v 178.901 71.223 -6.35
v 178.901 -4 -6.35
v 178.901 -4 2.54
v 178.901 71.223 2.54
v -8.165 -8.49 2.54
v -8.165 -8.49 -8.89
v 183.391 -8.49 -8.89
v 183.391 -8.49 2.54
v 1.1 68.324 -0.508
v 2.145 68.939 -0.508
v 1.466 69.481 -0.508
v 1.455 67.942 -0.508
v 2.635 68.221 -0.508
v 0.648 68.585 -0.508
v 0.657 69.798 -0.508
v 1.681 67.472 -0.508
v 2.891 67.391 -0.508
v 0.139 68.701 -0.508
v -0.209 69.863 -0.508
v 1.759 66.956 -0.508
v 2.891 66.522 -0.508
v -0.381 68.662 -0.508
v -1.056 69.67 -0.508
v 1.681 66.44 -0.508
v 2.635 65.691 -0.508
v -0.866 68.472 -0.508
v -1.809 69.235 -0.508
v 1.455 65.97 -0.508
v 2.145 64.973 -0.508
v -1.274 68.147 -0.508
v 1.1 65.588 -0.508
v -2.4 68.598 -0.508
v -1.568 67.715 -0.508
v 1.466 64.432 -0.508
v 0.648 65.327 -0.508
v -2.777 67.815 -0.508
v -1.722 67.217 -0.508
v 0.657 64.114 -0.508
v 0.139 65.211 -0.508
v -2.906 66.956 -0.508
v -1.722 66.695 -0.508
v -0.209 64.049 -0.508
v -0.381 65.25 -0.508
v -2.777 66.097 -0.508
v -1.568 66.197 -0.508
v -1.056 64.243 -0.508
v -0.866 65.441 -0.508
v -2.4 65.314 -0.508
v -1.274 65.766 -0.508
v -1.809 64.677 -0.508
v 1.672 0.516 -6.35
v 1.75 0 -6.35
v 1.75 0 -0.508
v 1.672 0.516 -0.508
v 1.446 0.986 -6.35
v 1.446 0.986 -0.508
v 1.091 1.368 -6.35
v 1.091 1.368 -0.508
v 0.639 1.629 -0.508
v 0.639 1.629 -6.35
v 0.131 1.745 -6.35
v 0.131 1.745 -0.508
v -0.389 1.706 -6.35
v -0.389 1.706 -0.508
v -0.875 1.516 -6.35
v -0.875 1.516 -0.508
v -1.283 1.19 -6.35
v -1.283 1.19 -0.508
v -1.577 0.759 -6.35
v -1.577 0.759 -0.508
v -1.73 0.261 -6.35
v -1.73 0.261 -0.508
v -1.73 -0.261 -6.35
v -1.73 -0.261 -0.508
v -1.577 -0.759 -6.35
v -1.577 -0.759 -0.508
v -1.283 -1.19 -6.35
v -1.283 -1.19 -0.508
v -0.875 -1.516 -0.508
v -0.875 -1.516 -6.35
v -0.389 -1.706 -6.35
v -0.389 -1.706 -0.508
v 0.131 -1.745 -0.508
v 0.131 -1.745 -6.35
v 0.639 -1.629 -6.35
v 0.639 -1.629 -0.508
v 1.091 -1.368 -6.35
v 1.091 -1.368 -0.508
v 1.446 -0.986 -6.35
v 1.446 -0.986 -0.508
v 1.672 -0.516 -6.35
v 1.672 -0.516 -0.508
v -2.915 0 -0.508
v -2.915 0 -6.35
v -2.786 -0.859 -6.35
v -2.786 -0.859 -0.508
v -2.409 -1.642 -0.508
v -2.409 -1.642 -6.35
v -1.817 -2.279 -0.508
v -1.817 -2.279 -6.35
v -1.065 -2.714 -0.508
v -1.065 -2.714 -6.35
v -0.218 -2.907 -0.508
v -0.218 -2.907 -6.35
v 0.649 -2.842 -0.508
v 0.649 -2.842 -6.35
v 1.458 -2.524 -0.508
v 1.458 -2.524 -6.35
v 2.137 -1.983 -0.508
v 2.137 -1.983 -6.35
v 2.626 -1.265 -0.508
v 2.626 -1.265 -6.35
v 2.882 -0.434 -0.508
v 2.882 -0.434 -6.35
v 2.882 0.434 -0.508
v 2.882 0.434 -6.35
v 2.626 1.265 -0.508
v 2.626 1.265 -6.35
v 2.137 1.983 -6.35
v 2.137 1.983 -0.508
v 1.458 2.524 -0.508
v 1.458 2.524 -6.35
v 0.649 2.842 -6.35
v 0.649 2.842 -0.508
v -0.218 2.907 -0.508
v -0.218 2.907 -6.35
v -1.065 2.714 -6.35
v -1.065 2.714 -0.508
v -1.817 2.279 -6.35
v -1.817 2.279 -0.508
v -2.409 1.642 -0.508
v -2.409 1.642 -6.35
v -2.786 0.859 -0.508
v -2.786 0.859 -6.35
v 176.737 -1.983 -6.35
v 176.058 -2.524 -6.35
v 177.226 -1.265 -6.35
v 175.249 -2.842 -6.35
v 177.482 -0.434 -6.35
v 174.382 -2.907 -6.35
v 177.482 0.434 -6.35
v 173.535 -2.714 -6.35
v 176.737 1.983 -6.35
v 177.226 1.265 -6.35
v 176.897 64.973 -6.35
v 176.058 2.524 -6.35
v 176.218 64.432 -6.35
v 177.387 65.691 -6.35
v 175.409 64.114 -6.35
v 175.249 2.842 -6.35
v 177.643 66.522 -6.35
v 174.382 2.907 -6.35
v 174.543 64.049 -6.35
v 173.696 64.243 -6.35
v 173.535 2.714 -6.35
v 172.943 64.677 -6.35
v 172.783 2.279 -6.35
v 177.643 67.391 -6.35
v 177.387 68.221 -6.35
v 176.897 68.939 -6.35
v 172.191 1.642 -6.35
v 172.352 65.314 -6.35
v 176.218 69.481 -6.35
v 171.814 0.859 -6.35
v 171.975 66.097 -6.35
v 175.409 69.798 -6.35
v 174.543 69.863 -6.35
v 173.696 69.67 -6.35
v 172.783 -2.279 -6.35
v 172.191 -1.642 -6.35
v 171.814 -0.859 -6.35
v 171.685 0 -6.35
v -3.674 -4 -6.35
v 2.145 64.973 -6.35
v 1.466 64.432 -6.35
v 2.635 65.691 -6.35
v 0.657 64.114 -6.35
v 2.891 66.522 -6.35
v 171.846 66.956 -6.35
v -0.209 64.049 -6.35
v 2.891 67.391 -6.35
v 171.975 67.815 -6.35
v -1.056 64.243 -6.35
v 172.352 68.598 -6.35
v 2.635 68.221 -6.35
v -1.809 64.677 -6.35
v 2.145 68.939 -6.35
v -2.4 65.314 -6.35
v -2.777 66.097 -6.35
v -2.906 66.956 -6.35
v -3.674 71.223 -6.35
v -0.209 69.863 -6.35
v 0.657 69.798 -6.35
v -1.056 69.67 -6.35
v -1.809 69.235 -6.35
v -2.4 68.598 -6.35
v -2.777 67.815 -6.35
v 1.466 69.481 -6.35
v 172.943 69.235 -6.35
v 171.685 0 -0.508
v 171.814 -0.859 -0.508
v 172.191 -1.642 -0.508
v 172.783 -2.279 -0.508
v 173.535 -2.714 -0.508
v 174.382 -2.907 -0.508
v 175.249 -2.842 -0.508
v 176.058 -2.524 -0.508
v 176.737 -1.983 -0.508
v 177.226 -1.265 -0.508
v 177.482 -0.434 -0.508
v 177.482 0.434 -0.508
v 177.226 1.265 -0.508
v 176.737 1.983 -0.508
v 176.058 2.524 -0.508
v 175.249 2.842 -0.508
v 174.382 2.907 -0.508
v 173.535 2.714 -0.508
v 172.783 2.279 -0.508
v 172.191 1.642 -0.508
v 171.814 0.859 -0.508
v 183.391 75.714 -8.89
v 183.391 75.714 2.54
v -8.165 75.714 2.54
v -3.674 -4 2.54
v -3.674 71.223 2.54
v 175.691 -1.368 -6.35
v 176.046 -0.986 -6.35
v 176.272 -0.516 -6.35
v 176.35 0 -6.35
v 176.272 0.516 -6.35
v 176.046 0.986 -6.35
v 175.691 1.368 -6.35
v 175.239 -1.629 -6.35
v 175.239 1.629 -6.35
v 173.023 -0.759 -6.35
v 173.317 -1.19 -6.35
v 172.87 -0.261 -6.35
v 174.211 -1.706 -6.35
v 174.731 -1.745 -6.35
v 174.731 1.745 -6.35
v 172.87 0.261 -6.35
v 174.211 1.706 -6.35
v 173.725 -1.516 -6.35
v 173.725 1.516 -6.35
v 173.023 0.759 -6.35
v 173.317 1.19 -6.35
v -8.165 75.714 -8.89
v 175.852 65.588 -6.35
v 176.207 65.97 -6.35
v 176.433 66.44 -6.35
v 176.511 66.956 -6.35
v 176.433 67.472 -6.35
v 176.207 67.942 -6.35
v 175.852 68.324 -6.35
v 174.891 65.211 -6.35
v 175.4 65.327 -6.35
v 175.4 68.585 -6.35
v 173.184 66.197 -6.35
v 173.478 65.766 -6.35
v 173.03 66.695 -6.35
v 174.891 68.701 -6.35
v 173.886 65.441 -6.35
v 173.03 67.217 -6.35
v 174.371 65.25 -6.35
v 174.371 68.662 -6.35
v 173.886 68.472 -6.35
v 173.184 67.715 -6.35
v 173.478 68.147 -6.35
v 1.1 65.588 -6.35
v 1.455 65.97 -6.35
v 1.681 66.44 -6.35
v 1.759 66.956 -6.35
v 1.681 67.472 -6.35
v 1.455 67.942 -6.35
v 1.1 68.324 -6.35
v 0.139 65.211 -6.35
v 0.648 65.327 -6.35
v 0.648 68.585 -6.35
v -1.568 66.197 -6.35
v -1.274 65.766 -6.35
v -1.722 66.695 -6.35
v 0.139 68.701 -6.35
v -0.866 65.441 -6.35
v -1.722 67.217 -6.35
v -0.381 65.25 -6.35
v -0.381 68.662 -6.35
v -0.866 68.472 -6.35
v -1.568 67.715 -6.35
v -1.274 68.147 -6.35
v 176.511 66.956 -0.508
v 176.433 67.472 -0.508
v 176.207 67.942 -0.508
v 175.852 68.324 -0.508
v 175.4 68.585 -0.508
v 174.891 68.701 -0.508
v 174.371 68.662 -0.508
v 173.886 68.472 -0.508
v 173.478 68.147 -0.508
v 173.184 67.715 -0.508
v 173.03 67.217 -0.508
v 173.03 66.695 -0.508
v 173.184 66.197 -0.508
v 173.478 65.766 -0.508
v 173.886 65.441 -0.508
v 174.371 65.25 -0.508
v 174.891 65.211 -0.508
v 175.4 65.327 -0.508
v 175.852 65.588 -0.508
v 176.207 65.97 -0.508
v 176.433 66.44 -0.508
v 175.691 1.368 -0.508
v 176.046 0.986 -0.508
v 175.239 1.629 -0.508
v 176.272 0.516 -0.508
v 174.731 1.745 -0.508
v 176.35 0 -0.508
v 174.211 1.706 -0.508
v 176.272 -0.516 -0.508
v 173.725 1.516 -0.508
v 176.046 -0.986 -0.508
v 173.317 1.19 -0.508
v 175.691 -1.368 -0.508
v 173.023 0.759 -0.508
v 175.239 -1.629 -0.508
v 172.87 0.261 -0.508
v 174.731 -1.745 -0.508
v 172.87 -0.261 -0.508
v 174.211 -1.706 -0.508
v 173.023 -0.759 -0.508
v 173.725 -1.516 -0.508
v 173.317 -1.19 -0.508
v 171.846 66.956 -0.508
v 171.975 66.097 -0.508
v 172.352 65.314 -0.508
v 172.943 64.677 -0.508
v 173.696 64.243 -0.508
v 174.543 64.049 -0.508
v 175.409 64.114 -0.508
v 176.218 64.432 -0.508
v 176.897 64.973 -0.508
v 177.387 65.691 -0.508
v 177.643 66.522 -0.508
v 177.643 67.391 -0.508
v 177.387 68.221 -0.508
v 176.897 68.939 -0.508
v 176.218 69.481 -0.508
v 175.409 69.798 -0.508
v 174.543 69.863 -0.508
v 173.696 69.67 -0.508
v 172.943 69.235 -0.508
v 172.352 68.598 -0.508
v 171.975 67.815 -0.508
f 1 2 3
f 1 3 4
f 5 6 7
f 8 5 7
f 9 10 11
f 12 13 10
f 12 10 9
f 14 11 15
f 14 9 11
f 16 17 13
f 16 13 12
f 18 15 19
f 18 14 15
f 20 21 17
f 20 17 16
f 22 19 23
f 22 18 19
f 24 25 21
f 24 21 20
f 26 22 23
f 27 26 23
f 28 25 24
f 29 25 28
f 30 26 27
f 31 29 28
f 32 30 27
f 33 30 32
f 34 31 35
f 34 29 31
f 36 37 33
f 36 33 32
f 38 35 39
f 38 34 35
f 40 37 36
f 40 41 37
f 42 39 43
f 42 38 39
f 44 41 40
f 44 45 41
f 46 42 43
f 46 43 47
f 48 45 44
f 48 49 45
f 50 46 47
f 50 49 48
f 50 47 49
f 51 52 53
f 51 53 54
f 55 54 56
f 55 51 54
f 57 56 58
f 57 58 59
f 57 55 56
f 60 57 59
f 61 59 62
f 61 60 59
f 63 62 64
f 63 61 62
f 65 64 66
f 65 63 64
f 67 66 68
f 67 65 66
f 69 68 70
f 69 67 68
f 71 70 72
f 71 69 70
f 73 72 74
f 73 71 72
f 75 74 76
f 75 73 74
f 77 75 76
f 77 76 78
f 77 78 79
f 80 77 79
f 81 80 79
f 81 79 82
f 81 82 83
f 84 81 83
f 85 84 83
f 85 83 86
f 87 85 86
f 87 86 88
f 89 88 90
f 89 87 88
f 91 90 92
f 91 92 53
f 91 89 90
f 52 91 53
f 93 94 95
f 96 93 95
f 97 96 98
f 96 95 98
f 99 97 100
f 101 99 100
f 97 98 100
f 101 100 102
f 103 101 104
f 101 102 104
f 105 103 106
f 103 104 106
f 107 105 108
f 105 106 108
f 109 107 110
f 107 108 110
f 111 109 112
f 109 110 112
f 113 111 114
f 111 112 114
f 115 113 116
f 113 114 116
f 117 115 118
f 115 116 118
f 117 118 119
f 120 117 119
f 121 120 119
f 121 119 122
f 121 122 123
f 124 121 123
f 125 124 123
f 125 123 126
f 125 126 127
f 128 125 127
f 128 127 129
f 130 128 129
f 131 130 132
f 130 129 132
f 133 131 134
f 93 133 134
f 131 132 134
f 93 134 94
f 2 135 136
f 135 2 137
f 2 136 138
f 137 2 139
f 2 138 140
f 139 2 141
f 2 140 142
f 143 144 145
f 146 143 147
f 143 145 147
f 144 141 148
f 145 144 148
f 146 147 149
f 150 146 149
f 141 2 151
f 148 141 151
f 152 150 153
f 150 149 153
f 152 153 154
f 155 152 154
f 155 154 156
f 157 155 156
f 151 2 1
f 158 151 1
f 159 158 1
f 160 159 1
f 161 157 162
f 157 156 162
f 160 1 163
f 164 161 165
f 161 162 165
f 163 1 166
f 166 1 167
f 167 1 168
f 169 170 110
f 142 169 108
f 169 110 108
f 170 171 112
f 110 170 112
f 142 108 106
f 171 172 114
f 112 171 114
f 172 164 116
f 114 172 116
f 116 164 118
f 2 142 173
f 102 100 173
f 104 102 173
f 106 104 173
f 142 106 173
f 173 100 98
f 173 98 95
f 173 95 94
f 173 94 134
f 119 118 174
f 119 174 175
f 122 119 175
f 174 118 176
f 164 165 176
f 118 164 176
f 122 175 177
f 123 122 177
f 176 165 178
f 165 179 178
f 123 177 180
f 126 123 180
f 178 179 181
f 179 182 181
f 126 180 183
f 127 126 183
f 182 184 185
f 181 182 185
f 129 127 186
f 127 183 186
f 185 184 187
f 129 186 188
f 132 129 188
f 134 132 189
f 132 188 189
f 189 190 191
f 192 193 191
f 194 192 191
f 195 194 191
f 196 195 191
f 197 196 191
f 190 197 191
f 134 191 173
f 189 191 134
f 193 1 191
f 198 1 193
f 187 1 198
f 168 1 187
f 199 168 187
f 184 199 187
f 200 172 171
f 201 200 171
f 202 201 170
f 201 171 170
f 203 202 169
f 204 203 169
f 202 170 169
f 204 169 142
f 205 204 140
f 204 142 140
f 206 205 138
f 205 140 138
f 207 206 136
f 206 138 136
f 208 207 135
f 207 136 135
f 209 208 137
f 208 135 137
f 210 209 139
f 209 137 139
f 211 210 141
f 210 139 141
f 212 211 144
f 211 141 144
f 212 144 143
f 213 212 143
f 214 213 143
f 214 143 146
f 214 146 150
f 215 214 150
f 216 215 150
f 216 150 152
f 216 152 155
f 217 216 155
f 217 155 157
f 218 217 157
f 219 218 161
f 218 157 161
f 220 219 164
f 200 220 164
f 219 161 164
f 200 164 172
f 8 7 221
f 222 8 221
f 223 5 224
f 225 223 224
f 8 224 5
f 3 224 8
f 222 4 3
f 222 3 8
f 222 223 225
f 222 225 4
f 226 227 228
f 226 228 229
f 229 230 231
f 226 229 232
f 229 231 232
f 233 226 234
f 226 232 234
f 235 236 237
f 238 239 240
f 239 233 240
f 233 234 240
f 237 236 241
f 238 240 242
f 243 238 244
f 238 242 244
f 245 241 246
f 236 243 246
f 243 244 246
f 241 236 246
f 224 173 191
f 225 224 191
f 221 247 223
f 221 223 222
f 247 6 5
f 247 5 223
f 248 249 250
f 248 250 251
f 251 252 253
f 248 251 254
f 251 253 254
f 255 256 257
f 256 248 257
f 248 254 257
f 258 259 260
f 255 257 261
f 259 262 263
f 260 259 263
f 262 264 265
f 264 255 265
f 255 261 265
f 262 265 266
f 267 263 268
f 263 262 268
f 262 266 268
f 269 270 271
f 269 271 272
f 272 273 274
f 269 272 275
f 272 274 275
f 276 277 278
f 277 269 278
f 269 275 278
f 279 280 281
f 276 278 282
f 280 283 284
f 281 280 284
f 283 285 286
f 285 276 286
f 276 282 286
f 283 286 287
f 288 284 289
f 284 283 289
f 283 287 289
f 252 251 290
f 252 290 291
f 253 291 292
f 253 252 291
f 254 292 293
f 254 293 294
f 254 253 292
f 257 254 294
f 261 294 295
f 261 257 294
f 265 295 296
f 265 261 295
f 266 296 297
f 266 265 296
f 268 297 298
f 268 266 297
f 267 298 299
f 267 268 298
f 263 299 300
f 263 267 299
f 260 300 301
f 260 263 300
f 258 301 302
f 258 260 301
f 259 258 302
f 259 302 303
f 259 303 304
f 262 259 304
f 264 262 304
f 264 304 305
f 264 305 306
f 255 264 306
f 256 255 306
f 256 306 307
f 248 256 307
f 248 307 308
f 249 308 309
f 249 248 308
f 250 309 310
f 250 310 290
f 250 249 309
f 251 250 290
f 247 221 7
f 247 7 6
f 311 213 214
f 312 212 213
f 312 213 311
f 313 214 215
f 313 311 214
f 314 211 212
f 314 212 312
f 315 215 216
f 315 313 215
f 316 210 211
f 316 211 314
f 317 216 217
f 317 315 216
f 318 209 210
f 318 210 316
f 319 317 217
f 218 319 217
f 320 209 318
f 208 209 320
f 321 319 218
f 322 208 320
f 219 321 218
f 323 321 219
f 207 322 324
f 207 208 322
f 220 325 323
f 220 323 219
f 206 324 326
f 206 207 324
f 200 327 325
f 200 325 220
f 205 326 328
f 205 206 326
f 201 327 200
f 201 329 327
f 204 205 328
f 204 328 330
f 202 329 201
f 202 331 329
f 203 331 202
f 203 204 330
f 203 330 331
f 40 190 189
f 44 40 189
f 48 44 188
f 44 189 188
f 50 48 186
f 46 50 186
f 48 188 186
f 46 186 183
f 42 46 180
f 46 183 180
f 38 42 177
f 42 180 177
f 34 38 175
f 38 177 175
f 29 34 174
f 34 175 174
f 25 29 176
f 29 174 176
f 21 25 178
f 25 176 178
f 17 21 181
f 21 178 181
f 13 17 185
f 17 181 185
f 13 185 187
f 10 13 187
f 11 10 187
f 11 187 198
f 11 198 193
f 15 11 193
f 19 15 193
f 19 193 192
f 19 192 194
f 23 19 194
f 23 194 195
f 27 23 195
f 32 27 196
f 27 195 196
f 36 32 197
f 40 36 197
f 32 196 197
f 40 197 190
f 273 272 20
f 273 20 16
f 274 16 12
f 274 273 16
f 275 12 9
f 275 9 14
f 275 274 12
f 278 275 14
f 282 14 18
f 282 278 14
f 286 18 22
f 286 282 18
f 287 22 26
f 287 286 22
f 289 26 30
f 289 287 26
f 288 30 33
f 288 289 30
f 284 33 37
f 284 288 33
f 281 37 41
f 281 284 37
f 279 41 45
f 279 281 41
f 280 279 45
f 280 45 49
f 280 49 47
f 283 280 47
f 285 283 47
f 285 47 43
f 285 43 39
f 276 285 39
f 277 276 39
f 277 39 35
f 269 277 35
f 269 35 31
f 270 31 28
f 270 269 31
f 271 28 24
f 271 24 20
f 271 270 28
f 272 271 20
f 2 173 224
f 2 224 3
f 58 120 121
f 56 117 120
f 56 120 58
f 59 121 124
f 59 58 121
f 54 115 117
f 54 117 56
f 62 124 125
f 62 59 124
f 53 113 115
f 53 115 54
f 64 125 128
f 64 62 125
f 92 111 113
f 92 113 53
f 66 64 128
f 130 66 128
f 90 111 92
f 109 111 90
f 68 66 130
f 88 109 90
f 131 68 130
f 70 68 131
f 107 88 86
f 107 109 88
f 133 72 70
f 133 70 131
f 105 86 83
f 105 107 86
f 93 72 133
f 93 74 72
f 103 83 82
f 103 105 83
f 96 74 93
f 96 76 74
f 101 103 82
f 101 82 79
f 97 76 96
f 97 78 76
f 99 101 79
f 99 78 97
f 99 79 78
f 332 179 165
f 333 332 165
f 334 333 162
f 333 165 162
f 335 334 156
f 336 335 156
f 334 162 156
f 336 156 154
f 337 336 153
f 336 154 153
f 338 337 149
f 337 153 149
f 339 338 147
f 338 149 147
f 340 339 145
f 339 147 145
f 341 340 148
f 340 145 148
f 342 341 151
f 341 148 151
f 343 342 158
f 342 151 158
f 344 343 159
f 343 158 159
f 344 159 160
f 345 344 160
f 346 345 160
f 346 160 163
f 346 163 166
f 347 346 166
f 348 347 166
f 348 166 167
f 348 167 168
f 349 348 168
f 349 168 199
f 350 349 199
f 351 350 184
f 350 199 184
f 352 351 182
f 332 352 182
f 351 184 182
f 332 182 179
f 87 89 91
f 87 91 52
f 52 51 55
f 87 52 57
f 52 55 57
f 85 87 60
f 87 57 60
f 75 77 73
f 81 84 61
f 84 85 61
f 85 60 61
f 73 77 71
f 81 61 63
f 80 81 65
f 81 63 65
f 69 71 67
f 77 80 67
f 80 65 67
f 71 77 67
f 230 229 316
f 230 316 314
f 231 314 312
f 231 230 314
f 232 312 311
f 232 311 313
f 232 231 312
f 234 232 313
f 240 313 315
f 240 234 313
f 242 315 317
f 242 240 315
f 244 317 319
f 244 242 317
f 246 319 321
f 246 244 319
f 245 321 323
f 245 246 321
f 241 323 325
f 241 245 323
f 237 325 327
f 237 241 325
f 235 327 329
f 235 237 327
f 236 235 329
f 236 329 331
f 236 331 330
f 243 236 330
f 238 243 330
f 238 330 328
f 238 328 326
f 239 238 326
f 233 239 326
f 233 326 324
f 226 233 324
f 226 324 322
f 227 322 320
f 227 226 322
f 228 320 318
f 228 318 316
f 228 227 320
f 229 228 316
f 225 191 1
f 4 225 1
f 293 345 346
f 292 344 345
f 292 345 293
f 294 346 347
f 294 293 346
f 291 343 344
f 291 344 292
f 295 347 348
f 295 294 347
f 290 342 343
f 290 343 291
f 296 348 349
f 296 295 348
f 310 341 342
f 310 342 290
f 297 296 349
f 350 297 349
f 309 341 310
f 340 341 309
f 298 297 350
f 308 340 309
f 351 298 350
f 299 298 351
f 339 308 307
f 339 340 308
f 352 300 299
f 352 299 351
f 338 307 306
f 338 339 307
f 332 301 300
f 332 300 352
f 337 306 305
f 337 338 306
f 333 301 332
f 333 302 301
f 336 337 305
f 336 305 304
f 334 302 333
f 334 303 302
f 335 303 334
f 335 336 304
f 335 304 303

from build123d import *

# Parameters (mm, degrees)
BOSS_EXTRUDE1_DEPTH      = 2.54
BOSS_EXTRUDE1_DEPTH_BACK = 8.89
SKETCH1_W                = 191.555456122
SKETCH1_H                = 84.203656122
SKETCH1_W_2              = 182.5752
SKETCH1_H_2              = 75.2234
SKETCH3_W                = 182.5752
SKETCH3_H                = 75.2234
BOSS_EXTRUDE4_DEPTH      = 2.54
SKETCH4_R                = 2.9150268
SKETCH4_R_2              = 1.75
BOSS_EXTRUDE6_DEPTH      = 5.842


with BuildPart() as part:
    # Sketch1 → Boss-Extrude1 (new, two sides: drawn at the far end of the back side and taken through both)
    with BuildSketch(Plane.XY.offset(-BOSS_EXTRUDE1_DEPTH_BACK)):
        with Locations((87.6132, 33.6117)):
            Rectangle(SKETCH1_W, SKETCH1_H)
        with Locations((87.6132, 33.6117)):
            Rectangle(SKETCH1_W_2, SKETCH1_H_2, mode=Mode.SUBTRACT)
    extrude(amount=BOSS_EXTRUDE1_DEPTH + BOSS_EXTRUDE1_DEPTH_BACK)

    # Sketch3 → Boss-Extrude4 (add)
    with BuildSketch(Plane(origin=(0, 0, -8.89), x_dir=(-1, 0, 0), z_dir=(0, 0, -1))):
        with Locations((-87.6132, 33.6117)):
            Rectangle(SKETCH3_W, SKETCH3_H)
    extrude(amount=-BOSS_EXTRUDE4_DEPTH)

    # Sketch4 → Boss-Extrude6 (add)
    # profile 1 of 4: a face of its own
    with BuildSketch(Plane.XY.offset(-6.35)):
        with Locations(Location((0.0086, 66.9562, 0), (0, 0, 180))):
            Circle(SKETCH4_R)
        with Locations((0.0086, 66.9562)):
            Circle(SKETCH4_R_2, mode=Mode.SUBTRACT)
    # profile 2 of 4: a face of its own
    with BuildSketch(Plane.XY.offset(-6.35)):
        with Locations(Location((174.7606, 66.9562, 0), (0, 0, 180))):
            Circle(SKETCH4_R)
        with Locations((174.7606, 66.9562)):
            Circle(SKETCH4_R_2, mode=Mode.SUBTRACT)
    # profile 3 of 4: a face of its own
    with BuildSketch(Plane.XY.offset(-6.35)):
        with Locations(Location((174.6, 0, 0), (0, 0, 180))):
            Circle(SKETCH4_R)
        with Locations((174.6, 0)):
            Circle(SKETCH4_R_2, mode=Mode.SUBTRACT)
    # profile 4 of 4: a face of its own
    with BuildSketch(Plane.XY.offset(-6.35)):
        with Locations(Location((0, 0, 0), (0, 0, 180))):
            Circle(SKETCH4_R)
        Circle(SKETCH4_R_2, mode=Mode.SUBTRACT)
    extrude(amount=BOSS_EXTRUDE6_DEPTH)


solid = part.part
